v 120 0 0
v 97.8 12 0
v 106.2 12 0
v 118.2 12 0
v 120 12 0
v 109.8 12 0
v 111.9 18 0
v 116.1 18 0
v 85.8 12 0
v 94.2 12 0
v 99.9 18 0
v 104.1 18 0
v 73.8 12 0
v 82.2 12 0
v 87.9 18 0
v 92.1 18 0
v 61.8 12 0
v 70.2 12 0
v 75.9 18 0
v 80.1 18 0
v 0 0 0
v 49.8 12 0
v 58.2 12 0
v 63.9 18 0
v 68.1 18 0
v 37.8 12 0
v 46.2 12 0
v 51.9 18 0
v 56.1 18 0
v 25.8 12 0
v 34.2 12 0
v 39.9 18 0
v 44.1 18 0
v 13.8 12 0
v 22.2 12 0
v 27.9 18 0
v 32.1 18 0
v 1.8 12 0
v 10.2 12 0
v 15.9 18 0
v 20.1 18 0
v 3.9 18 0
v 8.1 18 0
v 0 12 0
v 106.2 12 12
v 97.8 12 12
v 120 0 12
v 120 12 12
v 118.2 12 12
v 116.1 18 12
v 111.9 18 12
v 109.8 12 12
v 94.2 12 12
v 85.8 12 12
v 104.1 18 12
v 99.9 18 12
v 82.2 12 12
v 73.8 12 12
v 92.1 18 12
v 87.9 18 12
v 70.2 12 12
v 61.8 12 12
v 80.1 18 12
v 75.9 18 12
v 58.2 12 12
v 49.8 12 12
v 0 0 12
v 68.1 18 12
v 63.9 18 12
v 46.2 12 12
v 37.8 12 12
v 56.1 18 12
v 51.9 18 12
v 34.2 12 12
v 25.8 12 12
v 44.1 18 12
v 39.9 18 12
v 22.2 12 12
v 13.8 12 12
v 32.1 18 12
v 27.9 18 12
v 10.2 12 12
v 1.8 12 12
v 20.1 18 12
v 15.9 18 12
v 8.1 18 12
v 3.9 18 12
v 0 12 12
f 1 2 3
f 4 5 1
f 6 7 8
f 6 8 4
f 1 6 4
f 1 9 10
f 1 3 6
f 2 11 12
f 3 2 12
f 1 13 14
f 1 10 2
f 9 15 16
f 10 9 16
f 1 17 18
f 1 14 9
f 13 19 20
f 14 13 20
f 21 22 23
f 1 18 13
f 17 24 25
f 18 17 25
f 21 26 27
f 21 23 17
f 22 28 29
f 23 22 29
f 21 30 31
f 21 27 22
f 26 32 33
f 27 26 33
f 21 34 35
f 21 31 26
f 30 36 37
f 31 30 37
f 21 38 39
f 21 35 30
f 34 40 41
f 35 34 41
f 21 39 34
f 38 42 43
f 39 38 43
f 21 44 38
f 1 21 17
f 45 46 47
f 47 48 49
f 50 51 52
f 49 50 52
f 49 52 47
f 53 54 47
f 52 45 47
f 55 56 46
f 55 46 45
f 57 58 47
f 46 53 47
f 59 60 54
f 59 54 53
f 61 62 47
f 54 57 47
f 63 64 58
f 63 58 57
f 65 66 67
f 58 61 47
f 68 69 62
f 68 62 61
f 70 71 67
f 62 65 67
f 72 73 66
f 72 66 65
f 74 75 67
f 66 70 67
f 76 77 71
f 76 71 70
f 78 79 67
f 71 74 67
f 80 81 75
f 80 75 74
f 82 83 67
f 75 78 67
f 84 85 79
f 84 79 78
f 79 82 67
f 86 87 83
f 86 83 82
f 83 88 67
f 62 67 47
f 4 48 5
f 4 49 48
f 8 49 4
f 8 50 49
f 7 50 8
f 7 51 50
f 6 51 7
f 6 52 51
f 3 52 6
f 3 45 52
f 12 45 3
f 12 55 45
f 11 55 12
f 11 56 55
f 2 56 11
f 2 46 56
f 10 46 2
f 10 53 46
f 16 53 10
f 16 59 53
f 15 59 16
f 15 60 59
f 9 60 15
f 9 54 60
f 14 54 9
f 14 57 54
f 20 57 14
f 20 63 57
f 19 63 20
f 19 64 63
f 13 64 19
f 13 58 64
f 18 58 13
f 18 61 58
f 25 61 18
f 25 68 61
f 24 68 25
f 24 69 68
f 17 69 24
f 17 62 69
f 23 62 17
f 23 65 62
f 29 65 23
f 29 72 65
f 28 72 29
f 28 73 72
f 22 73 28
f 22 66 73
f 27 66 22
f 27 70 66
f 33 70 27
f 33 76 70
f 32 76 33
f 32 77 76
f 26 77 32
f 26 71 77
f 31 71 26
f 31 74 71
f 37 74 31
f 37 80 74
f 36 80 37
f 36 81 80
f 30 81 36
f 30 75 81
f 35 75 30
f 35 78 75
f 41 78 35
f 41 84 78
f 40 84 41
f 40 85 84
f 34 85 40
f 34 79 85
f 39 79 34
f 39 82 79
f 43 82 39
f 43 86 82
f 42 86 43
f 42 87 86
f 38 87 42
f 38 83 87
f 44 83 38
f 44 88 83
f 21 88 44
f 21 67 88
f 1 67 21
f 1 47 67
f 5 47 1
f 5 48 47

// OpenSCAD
$fn = 32;

// ----------------------------------------------------------------------
// Gear rack: 10 teeth, pitch 12 mm
// ----------------------------------------------------------------------

// --- parameters (mm) ---
teeth = 10;               // number of teeth
pitch = 12;               // tooth pitch, X
root_w = 8.4;             // tooth width at the root
tip_w = 4.2;              // tooth width at the tip
base_h = 12;              // rack body height, Y
tooth_h = 6;              // tooth height above the body
plate_t = 12;             // rack width, Z (extrusion height)

rack_l = teeth * pitch;  // overall length
total_h = base_h + tooth_h;  // overall height

profile = [[0, 0], [120, 0], [120, 12], [118.2, 12], [116.1, 18], [111.9, 18], [109.8, 12], [106.2, 12], [104.1, 18], [99.9, 18], [97.8, 12], [94.2, 12], [92.1, 18], [87.9, 18], [85.8, 12], [82.2, 12], [80.1, 18], [75.9, 18], [73.8, 12], [70.2, 12], [68.1, 18], [63.9, 18], [61.8, 12], [58.2, 12], [56.1, 18], [51.9, 18], [49.8, 12], [46.2, 12], [44.1, 18], [39.9, 18], [37.8, 12], [34.2, 12], [32.1, 18], [27.9, 18], [25.8, 12], [22.2, 12], [20.1, 18], [15.9, 18], [13.8, 12], [10.2, 12], [8.1, 18], [3.9, 18], [1.8, 12], [0, 12]];  // primary outline, 44 points, counter clockwise

// --- the one profile operation ---
linear_extrude(height = plate_t) polygon(points = profile);
